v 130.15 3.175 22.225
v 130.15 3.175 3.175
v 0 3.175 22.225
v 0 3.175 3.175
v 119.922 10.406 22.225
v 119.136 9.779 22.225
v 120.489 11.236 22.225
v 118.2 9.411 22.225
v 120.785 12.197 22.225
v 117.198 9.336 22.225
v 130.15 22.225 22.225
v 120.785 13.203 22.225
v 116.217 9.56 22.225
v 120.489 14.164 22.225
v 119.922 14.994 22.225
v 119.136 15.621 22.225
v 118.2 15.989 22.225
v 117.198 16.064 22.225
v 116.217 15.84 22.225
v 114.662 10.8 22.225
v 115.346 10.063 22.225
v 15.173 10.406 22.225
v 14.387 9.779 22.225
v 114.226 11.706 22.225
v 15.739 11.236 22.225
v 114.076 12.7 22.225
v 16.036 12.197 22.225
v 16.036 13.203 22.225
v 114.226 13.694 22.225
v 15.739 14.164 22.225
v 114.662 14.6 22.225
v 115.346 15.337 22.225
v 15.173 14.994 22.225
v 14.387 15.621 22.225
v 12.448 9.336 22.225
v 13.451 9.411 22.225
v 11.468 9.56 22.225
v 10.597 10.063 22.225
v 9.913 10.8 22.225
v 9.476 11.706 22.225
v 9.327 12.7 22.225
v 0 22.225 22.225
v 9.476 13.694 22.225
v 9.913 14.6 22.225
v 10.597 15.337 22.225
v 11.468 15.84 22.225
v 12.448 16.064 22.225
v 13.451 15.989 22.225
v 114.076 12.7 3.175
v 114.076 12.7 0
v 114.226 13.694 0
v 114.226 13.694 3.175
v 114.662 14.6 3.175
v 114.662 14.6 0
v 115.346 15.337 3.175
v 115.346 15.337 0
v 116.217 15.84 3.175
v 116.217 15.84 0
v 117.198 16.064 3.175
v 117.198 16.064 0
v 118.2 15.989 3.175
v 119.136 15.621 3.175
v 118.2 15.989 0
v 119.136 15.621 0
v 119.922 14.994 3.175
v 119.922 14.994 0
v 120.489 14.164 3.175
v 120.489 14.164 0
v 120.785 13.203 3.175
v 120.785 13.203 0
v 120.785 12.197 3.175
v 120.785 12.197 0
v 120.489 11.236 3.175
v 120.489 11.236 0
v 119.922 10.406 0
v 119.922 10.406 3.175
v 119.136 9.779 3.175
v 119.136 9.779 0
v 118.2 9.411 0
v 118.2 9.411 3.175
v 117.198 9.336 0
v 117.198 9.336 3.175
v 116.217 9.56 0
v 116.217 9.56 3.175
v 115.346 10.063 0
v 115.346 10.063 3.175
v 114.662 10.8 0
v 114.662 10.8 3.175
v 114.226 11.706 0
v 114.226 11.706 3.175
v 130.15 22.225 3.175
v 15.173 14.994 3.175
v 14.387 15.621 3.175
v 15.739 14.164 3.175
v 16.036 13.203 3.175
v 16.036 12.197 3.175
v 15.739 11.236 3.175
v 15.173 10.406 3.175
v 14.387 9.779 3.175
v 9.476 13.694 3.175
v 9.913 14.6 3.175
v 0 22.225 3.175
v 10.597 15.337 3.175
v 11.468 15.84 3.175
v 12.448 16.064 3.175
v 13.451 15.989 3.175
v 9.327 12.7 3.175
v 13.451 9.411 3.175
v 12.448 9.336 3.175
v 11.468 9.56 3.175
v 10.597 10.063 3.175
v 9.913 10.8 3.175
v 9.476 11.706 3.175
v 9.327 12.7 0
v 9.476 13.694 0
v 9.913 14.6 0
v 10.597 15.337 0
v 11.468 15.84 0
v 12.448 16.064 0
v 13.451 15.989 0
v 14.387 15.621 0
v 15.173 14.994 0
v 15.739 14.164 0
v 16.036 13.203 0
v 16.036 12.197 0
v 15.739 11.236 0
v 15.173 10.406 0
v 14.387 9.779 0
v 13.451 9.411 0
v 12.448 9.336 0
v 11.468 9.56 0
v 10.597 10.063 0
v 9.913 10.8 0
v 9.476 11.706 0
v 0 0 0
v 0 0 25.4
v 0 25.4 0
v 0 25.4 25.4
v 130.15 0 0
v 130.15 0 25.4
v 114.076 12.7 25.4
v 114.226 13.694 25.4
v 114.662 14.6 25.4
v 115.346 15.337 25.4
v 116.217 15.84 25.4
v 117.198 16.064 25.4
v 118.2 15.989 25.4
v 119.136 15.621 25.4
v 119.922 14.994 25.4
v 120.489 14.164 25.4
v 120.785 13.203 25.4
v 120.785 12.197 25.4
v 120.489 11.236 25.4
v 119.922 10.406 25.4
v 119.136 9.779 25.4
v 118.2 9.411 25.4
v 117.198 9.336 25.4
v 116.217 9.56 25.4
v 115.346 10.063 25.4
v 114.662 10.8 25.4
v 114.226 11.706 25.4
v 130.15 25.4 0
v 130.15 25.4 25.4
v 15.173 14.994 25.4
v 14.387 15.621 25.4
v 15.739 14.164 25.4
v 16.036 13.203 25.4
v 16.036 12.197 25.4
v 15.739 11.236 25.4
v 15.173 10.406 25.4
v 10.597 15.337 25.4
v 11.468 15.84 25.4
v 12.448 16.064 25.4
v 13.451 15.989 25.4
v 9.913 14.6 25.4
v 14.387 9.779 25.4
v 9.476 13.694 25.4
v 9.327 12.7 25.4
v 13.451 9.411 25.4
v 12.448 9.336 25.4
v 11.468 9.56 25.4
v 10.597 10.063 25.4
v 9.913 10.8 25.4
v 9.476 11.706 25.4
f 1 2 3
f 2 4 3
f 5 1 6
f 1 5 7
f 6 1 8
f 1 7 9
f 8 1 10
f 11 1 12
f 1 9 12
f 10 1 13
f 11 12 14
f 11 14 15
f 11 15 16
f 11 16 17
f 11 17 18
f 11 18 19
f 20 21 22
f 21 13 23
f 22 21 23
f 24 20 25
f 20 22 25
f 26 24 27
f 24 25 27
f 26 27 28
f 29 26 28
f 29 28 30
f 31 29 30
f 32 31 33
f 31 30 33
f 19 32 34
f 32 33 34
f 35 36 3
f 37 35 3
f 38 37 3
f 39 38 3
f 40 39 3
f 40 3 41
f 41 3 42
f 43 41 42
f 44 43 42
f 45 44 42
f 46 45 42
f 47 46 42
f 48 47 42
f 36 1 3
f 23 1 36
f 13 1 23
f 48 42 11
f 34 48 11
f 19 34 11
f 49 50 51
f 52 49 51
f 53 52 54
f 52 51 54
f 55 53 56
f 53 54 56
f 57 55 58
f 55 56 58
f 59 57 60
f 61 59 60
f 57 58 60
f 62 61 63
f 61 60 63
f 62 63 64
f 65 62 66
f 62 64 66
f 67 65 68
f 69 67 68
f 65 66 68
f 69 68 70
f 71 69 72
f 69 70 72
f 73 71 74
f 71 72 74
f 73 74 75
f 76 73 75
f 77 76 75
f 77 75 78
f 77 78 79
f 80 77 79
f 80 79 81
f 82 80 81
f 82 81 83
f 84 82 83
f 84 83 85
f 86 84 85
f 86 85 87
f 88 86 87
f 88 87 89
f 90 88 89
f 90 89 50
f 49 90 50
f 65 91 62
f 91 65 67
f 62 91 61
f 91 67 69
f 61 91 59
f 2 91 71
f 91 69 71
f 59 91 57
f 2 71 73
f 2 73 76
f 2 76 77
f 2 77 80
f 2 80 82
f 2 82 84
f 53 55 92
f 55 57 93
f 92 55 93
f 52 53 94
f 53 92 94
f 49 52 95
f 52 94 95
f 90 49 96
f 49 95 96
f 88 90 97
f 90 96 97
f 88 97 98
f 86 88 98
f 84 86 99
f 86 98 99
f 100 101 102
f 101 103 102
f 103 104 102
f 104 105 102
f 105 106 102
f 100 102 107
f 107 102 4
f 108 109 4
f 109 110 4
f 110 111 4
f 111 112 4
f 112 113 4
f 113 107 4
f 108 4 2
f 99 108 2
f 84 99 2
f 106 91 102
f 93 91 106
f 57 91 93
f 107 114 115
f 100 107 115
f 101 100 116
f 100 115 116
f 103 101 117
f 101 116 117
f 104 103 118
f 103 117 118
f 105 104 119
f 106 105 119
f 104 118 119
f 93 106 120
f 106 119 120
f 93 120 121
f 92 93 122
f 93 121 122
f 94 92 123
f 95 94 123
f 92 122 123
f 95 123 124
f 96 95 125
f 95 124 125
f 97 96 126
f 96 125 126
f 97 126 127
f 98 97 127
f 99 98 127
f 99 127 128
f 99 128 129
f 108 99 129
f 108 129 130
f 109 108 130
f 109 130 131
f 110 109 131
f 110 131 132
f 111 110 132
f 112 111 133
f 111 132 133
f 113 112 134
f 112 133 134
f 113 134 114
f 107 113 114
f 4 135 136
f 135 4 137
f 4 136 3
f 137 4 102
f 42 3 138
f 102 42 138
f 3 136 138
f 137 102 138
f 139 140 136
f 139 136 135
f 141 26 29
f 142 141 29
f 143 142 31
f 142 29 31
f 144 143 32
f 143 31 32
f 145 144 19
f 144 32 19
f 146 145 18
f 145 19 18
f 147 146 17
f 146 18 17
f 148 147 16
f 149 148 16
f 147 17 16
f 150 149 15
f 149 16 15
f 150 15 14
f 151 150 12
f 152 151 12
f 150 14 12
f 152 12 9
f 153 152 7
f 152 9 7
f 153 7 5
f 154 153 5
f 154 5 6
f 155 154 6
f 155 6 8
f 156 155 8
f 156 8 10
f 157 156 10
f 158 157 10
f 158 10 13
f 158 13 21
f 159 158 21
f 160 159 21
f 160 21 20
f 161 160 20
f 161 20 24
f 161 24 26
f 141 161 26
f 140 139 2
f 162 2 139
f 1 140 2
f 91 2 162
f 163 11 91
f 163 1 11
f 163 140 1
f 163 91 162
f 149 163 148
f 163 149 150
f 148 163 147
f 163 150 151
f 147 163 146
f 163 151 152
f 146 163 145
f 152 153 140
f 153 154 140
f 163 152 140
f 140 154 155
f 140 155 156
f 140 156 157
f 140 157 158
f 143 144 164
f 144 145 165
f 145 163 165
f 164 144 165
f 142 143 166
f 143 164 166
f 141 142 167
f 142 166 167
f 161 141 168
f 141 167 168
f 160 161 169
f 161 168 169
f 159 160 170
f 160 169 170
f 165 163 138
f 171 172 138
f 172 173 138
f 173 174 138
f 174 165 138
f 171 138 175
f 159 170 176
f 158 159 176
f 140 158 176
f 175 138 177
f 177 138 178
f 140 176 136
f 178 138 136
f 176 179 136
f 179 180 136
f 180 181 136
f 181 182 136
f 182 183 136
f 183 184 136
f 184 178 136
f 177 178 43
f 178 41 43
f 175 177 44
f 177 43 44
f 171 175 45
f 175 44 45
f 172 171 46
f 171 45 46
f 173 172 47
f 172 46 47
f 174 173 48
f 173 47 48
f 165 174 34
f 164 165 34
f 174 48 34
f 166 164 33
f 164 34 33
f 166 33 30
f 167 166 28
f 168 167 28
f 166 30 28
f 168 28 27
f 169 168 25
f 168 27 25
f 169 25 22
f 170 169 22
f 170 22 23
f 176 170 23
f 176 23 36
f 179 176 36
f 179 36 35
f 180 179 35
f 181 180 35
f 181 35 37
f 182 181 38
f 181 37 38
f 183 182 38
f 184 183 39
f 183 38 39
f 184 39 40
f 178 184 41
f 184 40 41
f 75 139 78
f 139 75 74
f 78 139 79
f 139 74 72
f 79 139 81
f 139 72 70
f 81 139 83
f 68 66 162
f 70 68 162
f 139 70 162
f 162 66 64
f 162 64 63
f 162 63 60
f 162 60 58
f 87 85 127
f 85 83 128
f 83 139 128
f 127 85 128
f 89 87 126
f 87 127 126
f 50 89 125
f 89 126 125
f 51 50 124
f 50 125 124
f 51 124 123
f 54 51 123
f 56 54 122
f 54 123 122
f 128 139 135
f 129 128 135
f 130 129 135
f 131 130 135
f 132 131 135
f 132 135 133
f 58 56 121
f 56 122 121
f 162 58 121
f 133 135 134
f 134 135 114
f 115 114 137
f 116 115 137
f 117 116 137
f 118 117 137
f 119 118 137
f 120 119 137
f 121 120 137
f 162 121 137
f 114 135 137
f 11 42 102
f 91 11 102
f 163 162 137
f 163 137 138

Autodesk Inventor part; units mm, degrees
ref_plane "YZ Plane" through (0, 0, 0) normal (1, 0, 0) x (0, 1, 0)
ref_plane "XZ Plane" through (0, 0, 0) normal (0, 1, 0) x (-1, 0, 0)
ref_plane "XY Plane" through (0, 0, 0) normal (0, 0, 1) x (1, 0, 0)
sketch "Sketch1" plane through (0, 0, 0) normal (1, 0, 0) x (0, 1, 0)
  line L0 (0, 0) -> (25.4, 0)
  line L1 (25.4, 0) -> (25.4, 25.4)
  line L2 (25.4, 25.4) -> (0, 25.4)
  line L3 (0, 25.4) -> (0, 0)
  line L4 (3.175, 22.225) -> (22.225, 22.225)
  line L5 (22.225, 22.225) -> (22.225, 3.175)
  line L6 (22.225, 3.175) -> (3.175, 3.175)
  line L7 (3.175, 3.175) -> (3.175, 22.225)
  dimension "d0" = 25.4
  dimension "d1" = 25.4
  dimension "d2" = 3.175
extrude "Extrusion1" add sketch "Sketch1" along normal blind 130.1496
sketch "Sketch2" plane through (0, 0, 0) normal (0, 0, -1) x (-1, 0, 0)
  circle A0 centre (-12.7, 12.7) radius 3.3734
  circle A1 centre (-117.4496, 12.7) radius 3.3734
  line L0 (0, 0) -> (0, 25.4) projected
  line L1 (-130.1496, 0) -> (-130.1496, 25.4) projected
  line L2 (0, 0) -> (-130.1496, 0) projected
  dimension "d5" = 6.7469
  dimension "d6" = 6.7469
  dimension "d7" = 12.7
  dimension "d8" = 12.7
  dimension "d9" = 12.7
  dimension "d10" = 12.7
extrude "Extrusion2" cut sketch "Sketch2" against normal blind 25.4
properties part number "support block"
